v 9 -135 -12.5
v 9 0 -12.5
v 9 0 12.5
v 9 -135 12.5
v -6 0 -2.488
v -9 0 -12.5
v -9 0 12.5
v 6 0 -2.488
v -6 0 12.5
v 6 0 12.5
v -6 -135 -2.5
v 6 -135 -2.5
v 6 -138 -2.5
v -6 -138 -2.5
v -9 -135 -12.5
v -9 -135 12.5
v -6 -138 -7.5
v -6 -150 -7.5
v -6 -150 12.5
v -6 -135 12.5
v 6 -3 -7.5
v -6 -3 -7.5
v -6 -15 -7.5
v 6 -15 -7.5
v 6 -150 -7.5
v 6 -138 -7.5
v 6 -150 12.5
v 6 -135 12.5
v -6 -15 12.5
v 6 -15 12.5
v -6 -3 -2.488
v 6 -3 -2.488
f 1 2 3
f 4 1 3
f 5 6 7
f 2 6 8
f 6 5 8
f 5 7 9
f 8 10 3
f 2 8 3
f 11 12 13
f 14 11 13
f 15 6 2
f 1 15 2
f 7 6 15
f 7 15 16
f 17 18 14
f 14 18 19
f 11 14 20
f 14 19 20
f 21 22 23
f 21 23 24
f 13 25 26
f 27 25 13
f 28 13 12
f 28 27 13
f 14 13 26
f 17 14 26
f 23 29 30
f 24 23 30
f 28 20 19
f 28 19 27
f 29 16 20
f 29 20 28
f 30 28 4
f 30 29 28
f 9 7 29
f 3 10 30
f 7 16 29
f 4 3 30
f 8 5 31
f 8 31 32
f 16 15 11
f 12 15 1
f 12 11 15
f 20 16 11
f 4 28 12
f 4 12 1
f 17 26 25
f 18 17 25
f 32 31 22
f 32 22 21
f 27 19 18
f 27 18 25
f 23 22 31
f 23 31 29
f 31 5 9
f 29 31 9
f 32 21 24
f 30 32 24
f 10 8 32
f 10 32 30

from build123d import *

# Parameters (mm, degrees)
F0_W     = 18
F0_H     = 25
F1_DEPTH = 150
F3_DEPTH = 25
F4_W     = 3
F4_H     = 15
F5_DEPTH = 25
F6_W     = 12
F6_H     = 12
F7_DEPTH = 20
F8_W     = 12
F8_H     = 15
F9_DEPTH = 5


with BuildPart() as f1:
    # F0 (on Front) → F1 (new body)
    with BuildSketch(Plane.XZ):
        Rectangle(F0_W, F0_H)
    extrude(amount=F1_DEPTH)

    # F2 (on face) → F3 (cut)
    with BuildSketch(Plane.YZ.offset(9)):
        Polygon((-150, -12.5), (-135, -12.5), (-135, -2.5), (-138, -2.5), (-138, -7.5), (-150, -7.5), align=None)
    extrude(amount=-F3_DEPTH, mode=Mode.SUBTRACT)

    # F4 (on face) → F5 (cut)
    with BuildSketch(Plane.XY.offset(12.5)):
        with Locations((7.5, -142.5)):
            Rectangle(F4_W, F4_H)
        with Locations((-7.5, -142.5)):
            Rectangle(F4_W, F4_H)
    extrude(amount=-F5_DEPTH, mode=Mode.SUBTRACT)

    # F6 (on face) → F7 (cut)
    with BuildSketch(Plane.XY.offset(12.5)):
        with Locations((0, -9)):
            Rectangle(F6_W, F6_H)
    extrude(amount=-F7_DEPTH, mode=Mode.SUBTRACT)

    # F8 (on face) → F9 (cut)
    with BuildSketch(Plane.XZ):
        with Locations((0, 5.012322)):
            Rectangle(F8_W, F8_H)
    extrude(amount=F9_DEPTH, mode=Mode.SUBTRACT)


solid = f1.part
